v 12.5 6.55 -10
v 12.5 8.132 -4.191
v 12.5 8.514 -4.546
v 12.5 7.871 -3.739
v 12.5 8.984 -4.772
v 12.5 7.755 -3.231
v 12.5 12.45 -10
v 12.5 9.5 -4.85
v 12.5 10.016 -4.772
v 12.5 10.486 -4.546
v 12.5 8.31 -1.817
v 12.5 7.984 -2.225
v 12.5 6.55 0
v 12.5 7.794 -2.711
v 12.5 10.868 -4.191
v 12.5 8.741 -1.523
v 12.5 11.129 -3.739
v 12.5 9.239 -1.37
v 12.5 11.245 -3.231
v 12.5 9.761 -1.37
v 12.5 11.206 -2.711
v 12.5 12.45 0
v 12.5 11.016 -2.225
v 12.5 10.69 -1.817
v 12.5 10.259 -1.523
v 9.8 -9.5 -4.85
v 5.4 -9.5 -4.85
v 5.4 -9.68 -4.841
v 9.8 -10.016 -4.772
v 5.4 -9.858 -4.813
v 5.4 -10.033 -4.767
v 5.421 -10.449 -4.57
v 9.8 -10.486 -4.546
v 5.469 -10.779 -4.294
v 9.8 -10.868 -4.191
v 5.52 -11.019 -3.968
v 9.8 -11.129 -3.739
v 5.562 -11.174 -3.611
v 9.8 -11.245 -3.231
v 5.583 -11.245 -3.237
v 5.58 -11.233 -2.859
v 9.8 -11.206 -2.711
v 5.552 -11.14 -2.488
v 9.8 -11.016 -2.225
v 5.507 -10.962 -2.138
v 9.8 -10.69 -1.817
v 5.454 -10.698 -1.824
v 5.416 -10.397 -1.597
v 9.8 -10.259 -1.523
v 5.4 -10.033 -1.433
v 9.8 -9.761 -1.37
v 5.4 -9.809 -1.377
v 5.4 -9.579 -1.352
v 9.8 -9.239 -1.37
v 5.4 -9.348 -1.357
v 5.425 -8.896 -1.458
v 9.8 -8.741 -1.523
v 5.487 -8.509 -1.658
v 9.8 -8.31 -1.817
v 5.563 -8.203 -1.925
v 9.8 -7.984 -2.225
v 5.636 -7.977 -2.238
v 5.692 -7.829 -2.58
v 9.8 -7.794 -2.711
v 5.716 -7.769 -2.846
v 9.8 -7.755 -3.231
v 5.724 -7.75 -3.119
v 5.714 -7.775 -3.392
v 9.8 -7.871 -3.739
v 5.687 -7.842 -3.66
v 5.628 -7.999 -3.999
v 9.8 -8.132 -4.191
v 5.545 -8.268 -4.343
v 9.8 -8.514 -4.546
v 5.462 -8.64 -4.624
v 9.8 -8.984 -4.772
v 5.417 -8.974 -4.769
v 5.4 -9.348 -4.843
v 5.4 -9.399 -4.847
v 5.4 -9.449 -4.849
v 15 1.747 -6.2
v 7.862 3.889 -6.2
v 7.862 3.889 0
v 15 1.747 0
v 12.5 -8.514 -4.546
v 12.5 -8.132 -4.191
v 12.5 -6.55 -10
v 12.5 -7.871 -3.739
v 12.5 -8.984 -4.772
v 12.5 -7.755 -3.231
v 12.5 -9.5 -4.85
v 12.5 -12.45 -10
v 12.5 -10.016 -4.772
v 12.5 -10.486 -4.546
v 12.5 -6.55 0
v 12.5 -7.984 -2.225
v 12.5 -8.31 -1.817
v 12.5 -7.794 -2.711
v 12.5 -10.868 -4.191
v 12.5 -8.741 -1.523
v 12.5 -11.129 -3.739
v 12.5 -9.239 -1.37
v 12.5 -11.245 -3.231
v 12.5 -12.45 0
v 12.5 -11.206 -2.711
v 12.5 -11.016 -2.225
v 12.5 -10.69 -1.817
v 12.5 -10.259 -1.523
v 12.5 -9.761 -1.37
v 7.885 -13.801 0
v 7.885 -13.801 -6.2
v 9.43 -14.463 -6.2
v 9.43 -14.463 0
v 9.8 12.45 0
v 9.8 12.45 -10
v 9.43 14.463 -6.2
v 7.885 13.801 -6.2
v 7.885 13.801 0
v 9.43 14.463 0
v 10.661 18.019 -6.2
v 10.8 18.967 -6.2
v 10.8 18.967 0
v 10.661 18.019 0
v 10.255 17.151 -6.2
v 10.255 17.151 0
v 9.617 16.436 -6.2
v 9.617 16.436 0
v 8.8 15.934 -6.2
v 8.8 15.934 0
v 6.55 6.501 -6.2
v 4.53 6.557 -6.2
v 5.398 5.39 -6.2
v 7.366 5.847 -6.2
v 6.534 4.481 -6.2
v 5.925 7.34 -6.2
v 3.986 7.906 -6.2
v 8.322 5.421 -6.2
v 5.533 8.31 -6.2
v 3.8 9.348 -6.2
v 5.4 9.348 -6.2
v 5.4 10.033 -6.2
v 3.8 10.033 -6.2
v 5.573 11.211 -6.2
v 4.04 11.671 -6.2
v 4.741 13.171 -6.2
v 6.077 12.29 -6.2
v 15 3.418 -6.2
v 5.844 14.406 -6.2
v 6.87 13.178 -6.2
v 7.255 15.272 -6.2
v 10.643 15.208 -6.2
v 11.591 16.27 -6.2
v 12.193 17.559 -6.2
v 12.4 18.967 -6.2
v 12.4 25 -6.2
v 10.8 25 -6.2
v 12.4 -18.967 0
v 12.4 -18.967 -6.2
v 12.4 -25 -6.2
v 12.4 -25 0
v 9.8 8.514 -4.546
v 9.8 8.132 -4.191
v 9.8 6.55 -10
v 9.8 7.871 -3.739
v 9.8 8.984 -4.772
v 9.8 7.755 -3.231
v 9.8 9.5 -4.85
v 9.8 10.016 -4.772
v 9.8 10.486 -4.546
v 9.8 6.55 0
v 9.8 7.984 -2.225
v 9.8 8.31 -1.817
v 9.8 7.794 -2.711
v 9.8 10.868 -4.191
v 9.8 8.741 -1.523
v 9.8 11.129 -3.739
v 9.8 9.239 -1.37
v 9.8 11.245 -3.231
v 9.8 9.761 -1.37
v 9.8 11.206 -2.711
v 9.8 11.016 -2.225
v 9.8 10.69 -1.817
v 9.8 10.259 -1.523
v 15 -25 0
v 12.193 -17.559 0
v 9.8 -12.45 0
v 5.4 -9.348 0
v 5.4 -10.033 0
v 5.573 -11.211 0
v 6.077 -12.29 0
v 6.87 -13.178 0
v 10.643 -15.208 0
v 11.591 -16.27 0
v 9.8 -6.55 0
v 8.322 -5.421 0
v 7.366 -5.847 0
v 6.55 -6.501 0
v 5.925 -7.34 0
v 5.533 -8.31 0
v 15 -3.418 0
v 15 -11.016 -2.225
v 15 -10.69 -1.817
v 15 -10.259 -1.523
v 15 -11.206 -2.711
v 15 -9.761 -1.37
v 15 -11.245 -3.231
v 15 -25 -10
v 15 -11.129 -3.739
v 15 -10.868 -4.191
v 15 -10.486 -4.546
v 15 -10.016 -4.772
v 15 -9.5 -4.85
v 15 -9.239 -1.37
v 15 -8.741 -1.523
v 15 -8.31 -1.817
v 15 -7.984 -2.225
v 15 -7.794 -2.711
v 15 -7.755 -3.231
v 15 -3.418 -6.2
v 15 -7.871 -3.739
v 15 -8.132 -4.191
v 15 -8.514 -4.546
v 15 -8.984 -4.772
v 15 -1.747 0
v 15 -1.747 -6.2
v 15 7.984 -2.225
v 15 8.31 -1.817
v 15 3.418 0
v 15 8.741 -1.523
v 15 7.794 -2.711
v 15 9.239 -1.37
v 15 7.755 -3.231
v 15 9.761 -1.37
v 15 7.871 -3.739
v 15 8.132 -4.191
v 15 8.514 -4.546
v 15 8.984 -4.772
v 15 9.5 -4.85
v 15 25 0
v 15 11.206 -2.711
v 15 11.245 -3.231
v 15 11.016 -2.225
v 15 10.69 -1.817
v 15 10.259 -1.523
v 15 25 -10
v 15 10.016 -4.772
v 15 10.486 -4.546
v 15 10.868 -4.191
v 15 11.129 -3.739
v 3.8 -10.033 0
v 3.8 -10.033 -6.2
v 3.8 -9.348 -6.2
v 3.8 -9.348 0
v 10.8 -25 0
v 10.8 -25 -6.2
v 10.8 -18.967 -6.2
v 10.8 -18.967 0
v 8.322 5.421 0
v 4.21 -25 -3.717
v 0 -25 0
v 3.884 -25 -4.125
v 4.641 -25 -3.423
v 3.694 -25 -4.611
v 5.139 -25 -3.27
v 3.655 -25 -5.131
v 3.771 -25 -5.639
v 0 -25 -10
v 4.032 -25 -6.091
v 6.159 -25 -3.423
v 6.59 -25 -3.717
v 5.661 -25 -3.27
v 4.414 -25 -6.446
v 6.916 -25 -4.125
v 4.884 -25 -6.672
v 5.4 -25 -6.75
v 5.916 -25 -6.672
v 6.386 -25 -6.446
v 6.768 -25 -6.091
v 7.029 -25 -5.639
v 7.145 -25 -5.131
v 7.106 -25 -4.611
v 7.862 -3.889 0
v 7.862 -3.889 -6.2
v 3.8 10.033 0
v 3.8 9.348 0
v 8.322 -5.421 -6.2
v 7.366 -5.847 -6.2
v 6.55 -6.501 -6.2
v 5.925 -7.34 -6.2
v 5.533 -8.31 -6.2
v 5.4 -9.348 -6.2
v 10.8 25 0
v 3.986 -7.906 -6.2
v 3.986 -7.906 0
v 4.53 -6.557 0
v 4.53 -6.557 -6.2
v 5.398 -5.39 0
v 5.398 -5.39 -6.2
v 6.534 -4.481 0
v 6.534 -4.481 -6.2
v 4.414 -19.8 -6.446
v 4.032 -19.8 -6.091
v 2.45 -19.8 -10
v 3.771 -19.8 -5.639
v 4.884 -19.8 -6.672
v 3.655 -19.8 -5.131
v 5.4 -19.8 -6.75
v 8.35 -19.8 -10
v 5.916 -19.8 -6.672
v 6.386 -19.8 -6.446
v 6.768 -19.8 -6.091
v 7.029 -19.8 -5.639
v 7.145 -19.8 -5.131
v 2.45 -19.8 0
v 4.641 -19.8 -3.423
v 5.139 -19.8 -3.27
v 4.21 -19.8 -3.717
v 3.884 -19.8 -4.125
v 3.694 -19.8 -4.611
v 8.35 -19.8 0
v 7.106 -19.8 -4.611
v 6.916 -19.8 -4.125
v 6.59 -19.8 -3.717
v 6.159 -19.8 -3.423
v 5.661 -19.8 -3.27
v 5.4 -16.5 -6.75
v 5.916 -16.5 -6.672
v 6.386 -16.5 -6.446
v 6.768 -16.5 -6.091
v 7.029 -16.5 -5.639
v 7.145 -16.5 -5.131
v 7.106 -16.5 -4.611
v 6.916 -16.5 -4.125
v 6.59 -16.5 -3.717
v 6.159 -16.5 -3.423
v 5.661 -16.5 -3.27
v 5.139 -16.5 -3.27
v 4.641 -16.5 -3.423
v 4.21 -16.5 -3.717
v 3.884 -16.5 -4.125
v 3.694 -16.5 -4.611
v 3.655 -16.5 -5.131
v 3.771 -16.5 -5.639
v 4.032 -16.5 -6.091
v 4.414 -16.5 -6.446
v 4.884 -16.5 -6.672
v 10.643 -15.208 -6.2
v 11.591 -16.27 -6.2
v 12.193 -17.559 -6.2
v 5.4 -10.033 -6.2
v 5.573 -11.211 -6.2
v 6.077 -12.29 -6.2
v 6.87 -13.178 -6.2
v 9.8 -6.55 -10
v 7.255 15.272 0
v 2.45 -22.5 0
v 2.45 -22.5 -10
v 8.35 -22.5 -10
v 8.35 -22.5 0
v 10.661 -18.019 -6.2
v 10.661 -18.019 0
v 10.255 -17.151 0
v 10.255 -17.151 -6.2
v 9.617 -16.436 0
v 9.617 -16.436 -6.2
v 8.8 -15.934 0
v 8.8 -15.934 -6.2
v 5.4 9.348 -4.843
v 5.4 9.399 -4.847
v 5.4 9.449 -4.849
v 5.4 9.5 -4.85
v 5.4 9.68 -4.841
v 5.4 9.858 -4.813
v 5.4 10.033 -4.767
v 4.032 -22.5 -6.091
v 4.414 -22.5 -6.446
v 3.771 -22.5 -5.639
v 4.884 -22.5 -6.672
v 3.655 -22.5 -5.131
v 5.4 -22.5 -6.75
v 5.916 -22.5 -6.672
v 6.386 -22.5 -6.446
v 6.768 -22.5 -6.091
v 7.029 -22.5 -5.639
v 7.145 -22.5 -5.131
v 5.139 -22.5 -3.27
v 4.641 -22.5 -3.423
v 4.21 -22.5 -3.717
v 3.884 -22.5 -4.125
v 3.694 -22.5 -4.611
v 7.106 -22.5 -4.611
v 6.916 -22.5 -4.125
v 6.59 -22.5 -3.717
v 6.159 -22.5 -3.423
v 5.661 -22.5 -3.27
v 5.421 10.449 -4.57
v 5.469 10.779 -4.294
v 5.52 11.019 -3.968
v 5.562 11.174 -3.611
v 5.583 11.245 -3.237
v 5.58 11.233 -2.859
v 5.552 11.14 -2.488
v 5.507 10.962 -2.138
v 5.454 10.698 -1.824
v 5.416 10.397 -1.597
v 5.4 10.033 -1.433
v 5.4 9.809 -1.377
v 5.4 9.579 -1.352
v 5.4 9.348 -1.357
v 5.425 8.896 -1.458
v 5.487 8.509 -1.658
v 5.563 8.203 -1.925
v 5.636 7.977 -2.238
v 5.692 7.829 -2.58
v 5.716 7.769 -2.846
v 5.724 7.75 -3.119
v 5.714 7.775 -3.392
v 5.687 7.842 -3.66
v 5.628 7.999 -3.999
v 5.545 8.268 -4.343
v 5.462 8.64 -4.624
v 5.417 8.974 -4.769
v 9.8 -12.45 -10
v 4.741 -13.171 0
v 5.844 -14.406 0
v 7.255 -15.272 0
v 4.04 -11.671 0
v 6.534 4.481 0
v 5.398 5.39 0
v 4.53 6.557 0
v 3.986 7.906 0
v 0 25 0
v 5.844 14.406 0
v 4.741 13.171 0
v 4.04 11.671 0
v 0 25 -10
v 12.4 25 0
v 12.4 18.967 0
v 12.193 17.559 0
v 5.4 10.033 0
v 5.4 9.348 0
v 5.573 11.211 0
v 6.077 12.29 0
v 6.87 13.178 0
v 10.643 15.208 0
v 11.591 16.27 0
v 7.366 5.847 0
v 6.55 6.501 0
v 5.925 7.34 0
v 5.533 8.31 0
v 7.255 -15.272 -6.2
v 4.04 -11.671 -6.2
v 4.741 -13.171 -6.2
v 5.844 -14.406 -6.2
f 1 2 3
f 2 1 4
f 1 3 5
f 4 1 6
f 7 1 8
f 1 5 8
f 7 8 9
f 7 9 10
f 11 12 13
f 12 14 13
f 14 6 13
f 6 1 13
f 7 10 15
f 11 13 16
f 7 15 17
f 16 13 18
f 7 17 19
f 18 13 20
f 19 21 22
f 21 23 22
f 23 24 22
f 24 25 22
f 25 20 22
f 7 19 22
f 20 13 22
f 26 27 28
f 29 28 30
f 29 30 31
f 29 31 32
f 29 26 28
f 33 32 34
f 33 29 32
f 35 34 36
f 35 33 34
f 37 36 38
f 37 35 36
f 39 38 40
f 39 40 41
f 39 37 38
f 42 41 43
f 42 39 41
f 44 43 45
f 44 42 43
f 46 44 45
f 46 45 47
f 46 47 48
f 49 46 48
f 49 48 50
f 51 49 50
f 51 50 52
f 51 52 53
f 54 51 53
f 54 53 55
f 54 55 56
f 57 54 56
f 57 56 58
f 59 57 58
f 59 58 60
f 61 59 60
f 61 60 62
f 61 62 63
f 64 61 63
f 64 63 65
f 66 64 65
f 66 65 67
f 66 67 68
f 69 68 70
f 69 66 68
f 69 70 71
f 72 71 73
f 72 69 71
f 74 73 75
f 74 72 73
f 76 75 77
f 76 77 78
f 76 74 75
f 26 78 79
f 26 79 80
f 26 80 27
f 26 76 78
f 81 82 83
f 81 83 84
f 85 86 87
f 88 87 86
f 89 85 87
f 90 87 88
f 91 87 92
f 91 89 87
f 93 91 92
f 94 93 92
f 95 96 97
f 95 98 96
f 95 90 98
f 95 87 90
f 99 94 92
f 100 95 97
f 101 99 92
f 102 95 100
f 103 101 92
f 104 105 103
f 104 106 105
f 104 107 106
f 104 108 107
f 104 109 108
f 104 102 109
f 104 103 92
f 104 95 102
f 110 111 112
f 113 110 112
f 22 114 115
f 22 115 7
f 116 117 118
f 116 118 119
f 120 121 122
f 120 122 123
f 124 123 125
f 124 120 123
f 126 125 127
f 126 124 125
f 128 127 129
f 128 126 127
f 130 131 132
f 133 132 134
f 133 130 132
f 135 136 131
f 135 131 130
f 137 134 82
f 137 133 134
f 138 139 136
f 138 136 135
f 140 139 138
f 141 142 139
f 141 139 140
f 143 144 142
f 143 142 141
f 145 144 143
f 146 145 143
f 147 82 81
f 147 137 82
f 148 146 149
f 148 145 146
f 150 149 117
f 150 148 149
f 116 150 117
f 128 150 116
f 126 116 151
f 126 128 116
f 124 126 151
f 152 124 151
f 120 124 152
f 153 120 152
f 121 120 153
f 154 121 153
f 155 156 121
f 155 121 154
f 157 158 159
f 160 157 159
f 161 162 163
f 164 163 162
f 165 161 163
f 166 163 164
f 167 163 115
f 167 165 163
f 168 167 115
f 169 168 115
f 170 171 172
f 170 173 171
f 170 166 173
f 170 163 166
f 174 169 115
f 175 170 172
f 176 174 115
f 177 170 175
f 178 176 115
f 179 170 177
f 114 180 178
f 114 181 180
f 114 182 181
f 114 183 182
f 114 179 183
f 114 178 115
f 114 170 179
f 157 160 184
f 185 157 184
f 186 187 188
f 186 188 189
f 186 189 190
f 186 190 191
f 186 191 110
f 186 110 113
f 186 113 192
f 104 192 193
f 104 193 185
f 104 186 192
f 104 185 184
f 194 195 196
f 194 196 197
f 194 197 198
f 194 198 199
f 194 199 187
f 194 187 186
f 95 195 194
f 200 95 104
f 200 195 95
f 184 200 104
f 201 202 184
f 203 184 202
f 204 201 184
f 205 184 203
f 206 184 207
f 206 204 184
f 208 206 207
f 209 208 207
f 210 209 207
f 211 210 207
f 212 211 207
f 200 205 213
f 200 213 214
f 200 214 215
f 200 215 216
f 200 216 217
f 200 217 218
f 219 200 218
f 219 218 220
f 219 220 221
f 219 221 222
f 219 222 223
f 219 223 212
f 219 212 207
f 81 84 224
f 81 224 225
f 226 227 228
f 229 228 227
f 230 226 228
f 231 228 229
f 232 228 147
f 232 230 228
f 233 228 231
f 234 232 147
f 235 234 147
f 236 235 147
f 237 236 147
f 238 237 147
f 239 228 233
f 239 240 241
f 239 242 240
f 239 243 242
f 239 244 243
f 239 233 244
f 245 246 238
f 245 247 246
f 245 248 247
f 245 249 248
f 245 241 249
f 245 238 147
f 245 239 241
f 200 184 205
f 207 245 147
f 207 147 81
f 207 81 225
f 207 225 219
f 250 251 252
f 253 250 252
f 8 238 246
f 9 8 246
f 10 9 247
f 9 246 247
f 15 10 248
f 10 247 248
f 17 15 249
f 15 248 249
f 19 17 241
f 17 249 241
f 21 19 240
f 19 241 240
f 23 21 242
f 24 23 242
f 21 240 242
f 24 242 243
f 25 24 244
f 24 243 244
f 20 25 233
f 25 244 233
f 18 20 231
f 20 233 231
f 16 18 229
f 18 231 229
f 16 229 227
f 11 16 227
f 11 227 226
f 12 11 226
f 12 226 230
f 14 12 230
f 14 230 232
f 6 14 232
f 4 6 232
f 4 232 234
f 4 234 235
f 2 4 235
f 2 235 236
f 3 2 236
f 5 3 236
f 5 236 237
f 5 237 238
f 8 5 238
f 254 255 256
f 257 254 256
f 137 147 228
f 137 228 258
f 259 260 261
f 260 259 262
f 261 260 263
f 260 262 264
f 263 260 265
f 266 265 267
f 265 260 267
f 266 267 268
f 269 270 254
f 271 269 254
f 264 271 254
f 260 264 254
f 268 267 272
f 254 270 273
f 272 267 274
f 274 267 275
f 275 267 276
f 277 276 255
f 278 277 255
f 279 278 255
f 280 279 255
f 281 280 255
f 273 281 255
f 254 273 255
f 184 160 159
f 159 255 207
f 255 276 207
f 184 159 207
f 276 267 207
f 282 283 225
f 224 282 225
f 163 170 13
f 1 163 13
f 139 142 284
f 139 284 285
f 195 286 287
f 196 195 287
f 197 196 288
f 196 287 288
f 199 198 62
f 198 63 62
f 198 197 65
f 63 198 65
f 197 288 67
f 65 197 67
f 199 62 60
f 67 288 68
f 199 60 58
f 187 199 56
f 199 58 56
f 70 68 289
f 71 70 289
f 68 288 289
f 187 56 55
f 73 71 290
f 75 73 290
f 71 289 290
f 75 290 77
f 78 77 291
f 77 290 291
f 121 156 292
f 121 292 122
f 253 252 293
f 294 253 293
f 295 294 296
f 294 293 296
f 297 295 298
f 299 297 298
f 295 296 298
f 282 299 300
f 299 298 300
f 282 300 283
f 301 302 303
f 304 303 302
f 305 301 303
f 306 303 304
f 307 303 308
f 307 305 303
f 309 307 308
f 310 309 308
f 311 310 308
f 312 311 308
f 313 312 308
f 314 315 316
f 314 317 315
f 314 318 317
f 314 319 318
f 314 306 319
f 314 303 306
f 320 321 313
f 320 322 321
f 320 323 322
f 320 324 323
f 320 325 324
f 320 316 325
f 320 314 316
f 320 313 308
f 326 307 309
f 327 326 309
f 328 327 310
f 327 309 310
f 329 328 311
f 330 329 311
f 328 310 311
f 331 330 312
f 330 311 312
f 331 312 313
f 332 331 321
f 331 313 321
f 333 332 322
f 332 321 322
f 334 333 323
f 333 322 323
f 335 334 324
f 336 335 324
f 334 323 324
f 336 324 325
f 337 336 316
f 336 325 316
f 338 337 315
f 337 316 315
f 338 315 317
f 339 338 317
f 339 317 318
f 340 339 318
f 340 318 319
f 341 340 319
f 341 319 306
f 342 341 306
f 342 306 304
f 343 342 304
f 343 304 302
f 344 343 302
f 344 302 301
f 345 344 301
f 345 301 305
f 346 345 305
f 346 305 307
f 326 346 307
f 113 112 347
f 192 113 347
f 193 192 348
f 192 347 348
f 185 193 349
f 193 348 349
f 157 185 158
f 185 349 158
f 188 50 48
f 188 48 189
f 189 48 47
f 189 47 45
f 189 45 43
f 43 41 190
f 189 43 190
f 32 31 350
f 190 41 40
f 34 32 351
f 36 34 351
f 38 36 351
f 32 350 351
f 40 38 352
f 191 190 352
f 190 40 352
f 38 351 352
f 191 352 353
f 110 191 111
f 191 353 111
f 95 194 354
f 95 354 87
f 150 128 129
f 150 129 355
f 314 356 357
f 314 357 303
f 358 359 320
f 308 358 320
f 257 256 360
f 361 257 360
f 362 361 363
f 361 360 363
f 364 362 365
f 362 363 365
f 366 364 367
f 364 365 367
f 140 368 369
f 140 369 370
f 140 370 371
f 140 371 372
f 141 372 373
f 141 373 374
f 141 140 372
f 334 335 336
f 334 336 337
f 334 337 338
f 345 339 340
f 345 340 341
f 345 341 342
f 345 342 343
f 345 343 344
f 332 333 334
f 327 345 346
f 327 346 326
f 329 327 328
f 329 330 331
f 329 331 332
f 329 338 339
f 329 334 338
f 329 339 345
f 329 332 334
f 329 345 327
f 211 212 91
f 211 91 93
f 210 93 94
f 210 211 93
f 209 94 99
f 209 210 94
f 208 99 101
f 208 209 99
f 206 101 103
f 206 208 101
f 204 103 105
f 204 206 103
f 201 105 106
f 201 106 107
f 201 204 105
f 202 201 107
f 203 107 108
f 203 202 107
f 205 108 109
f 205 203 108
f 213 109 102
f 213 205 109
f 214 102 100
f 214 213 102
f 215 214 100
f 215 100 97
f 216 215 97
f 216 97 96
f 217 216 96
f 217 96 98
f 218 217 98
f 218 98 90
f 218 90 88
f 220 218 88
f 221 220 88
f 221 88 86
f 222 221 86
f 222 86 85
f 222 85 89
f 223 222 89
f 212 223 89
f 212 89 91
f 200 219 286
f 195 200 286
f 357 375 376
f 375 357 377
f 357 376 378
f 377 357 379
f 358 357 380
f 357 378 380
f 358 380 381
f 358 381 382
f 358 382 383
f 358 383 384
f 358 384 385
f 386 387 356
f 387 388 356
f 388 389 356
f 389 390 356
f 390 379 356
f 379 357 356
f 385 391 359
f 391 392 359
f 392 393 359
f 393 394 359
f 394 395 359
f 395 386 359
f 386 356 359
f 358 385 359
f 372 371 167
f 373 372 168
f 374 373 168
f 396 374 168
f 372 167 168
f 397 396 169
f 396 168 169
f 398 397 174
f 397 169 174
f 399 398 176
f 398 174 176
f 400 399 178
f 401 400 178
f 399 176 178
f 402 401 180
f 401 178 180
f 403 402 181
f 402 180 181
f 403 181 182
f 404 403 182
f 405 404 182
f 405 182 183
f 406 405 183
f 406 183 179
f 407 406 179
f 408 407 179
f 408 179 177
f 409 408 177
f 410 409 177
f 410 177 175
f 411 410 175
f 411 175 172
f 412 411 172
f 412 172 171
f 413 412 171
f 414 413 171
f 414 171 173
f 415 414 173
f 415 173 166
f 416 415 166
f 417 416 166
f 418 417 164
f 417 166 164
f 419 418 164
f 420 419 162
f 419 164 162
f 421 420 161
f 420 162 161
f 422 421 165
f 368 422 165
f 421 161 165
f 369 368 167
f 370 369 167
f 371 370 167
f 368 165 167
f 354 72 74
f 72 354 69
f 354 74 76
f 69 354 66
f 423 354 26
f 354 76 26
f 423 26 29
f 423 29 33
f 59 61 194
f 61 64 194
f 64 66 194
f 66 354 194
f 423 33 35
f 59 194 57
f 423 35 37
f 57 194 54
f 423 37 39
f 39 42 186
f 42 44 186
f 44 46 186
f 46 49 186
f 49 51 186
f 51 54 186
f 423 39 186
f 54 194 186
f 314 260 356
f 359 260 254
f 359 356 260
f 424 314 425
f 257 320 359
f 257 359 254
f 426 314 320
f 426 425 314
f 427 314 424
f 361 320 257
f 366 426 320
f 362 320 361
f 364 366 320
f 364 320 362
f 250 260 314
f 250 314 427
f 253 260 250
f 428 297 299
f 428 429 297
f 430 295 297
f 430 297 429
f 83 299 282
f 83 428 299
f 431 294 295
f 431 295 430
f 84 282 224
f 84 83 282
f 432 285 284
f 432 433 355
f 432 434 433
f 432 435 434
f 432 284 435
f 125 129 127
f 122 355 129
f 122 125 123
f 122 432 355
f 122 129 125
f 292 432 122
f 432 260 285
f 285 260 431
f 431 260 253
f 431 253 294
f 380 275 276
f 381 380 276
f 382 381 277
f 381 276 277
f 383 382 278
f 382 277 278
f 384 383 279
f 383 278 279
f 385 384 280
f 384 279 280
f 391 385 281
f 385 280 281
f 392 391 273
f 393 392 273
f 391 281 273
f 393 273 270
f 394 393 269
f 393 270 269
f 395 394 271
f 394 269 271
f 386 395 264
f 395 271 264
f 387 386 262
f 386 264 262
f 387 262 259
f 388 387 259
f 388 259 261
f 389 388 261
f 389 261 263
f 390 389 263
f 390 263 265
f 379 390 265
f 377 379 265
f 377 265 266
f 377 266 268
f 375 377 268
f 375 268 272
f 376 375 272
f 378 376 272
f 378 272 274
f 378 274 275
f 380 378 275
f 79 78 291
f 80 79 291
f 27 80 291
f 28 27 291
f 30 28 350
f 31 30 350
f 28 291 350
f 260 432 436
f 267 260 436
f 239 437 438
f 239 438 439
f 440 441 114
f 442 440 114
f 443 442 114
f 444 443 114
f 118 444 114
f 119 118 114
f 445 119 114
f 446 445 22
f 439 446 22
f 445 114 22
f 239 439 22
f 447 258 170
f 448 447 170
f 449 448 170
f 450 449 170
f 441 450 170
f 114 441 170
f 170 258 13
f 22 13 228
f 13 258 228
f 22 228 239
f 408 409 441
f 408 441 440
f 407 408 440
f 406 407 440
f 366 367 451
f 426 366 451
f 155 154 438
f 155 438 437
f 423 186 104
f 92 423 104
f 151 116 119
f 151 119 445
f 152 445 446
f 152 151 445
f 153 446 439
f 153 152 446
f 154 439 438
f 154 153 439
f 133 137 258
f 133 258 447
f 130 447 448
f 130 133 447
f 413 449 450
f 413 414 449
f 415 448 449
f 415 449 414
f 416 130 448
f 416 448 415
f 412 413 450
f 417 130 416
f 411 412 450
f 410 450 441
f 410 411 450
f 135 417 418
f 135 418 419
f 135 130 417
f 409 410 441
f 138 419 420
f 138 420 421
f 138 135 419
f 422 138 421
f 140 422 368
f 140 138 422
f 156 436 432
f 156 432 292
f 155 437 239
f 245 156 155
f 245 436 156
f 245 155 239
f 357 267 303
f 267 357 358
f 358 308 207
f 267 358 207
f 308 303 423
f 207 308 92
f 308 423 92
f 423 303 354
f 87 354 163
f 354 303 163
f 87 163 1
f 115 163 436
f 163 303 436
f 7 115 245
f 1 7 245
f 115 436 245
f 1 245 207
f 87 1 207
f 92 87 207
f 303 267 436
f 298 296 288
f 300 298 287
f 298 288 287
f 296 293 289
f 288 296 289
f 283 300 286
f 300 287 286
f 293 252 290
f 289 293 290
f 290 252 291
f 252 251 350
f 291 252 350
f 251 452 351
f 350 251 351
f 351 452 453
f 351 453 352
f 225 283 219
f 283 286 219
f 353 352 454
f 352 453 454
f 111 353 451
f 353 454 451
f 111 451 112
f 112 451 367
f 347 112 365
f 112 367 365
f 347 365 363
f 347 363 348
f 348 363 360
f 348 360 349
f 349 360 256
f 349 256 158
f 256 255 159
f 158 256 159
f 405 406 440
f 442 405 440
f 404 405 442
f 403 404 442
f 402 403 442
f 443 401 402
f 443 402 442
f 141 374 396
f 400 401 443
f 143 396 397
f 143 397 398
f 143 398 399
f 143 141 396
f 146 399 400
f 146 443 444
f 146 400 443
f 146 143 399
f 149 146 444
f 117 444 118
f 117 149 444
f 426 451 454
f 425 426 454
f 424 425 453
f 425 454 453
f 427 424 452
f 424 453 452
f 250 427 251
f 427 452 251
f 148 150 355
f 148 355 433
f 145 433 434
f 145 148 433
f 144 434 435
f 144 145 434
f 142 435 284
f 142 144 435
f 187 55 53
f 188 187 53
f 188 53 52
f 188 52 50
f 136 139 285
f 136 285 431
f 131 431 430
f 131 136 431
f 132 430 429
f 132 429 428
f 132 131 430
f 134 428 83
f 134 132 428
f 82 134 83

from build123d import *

# Parameters (mm, degrees)
ESQUISSE1_W                           = 15
ESQUISSE1_H                           = 10
BOSS_EXTRU_1_DEPTH                    = 25
ENL_VEMENT_START                      = -6.2
ENL_VEMENT_DE_MATI_RE_BALAYAGE1_DEPTH = 6.2
ENL_V_MAT_EXTRU_1_REACH               = 32.822
ESQUISSE4_R                           = 1.75
ENL_V_MAT_EXTRU_2_REACH               = 32.822
ESQUISSE5_W                           = 2.7
ESQUISSE5_H                           = 5.9
ENL_V_MAT_EXTRU_3_REACH               = 32.822
ESQUISSE6_W                           = 5.9
ESQUISSE6_H                           = 2.7
ESQUISSE7_R                           = 1.75
ENL_V_MAT_EXTRU_4_DEPTH               = 8.5


# Read off the part's stored shape, not the designer's step: Enlèvement de matière-Balayage1
with BuildPart() as part:
    # Esquisse1 → Boss.-Extru.1 (new body)
    with BuildSketch(Plane(origin=(0, 0, 0), x_dir=(1, 0, 0), z_dir=(0, 1, 0))):
        with Locations((7.5, 5)):
            Rectangle(ESQUISSE1_W, ESQUISSE1_H)
    extrude(amount=BOSS_EXTRU_1_DEPTH)

    # Enlèvement de matière-Balayage1 outline → Enlèvement de matière-Balayage1 (cut)
    with BuildSketch(Plane.XY.offset(ENL_VEMENT_START)):
        with BuildLine():
            Line((10.8, 25), (10.8, 18.967282711))
            ThreePointArc((10.8, 18.967282711), (10.254975604, 17.150662382), (8.799933685, 15.934104112))
            Line((8.799933685, 15.934104112), (7.254659998, 15.27184396))
            ThreePointArc((7.254659998, 15.27184396), (4.741405774, 13.170516039), (3.8, 10.032717289))
            Line((3.8, 10.032717289), (3.8, 9.348137929))
            ThreePointArc((3.8, 9.348137929), (4.926930309, 5.94563391), (7.862117052, 3.888528103))
            Line((7.862117052, 3.888528103), (15, 1.747163219))
            Line((15, 1.747163219), (15, 3.41761226))
            Line((15, 3.41761226), (8.321873669, 5.42105016))
            ThreePointArc((8.321873669, 5.42105016), (6.210598994, 6.900722757), (5.4, 9.348137929))
            Line((5.4, 9.348137929), (5.4, 10.032717289))
            ThreePointArc((5.4, 10.032717289), (6.077151522, 12.289730425), (7.884930876, 13.801211912))
            Line((7.884930876, 13.801211912), (9.430204563, 14.463472064))
            ThreePointArc((9.430204563, 14.463472064), (11.590721352, 16.269876768), (12.4, 18.967282711))
            Line((12.4, 18.967282711), (12.4, 25))
            Line((12.4, 25), (10.8, 25))
        make_face()
    extrude(amount=ENL_VEMENT_DE_MATI_RE_BALAYAGE1_DEPTH, mode=Mode.SUBTRACT)

    # Esquisse4 → Enlèv. mat.-Extru.1 (cut, up to next)
    with BuildSketch(Plane(origin=(15, 0, 0), x_dir=(0, 0, -1), z_dir=(1, 0, 0)), mode=Mode.PRIVATE) as enl_v_mat_extru_1_sk1:
        with Locations((3.1, 9.5)):
            Circle(ESQUISSE4_R)
    enl_v_mat_extru_1_tool1 = extrude(enl_v_mat_extru_1_sk1.sketch, amount=-ENL_V_MAT_EXTRU_1_REACH, mode=Mode.PRIVATE) & part.part
    add(enl_v_mat_extru_1_tool1.solids().sort_by_distance((15, 9.5, -3.1))[0], mode=Mode.SUBTRACT)

    # Esquisse5 → Enlèv. mat.-Extru.2 (cut, up to next)
    with BuildSketch(Plane.XY, mode=Mode.PRIVATE) as enl_v_mat_extru_2_sk1:
        with Locations((11.15, 9.5)):
            Rectangle(ESQUISSE5_W, ESQUISSE5_H)
    enl_v_mat_extru_2_tool1 = extrude(enl_v_mat_extru_2_sk1.sketch, amount=-ENL_V_MAT_EXTRU_2_REACH, mode=Mode.PRIVATE) & part.part
    add(enl_v_mat_extru_2_tool1.solids().sort_by_distance((11.15, 9.5, 0))[0], mode=Mode.SUBTRACT)

    # Symétrie1: part across plane


with BuildPart() as part_1:
    add(part.part)
    add(part.part.mirror(Plane(origin=(0, 0, 0), x_dir=(0, 0, 1), z_dir=(0, -1, 0))))

    # Esquisse6 → Enlèv. mat.-Extru.3 (cut, up to next)
    with BuildSketch(Plane.XY, mode=Mode.PRIVATE) as enl_v_mat_extru_3_sk1:
        with Locations((5.4, -21.15)):
            Rectangle(ESQUISSE6_W, ESQUISSE6_H)
    enl_v_mat_extru_3_tool1 = extrude(enl_v_mat_extru_3_sk1.sketch, amount=-ENL_V_MAT_EXTRU_3_REACH, mode=Mode.PRIVATE) & part_1.part
    add(enl_v_mat_extru_3_tool1.solids().sort_by_distance((5.4, -21.15, 0))[0], mode=Mode.SUBTRACT)

    # Esquisse7 → Enlèv. mat.-Extru.4 (cut)
    with BuildSketch(Plane.XZ.offset(25)):
        with Locations(Location((5.4, -5, 0), (0, 0, 270))):
            Circle(ESQUISSE7_R)
    extrude(amount=-ENL_V_MAT_EXTRU_4_DEPTH, mode=Mode.SUBTRACT)


solid = part_1.part
